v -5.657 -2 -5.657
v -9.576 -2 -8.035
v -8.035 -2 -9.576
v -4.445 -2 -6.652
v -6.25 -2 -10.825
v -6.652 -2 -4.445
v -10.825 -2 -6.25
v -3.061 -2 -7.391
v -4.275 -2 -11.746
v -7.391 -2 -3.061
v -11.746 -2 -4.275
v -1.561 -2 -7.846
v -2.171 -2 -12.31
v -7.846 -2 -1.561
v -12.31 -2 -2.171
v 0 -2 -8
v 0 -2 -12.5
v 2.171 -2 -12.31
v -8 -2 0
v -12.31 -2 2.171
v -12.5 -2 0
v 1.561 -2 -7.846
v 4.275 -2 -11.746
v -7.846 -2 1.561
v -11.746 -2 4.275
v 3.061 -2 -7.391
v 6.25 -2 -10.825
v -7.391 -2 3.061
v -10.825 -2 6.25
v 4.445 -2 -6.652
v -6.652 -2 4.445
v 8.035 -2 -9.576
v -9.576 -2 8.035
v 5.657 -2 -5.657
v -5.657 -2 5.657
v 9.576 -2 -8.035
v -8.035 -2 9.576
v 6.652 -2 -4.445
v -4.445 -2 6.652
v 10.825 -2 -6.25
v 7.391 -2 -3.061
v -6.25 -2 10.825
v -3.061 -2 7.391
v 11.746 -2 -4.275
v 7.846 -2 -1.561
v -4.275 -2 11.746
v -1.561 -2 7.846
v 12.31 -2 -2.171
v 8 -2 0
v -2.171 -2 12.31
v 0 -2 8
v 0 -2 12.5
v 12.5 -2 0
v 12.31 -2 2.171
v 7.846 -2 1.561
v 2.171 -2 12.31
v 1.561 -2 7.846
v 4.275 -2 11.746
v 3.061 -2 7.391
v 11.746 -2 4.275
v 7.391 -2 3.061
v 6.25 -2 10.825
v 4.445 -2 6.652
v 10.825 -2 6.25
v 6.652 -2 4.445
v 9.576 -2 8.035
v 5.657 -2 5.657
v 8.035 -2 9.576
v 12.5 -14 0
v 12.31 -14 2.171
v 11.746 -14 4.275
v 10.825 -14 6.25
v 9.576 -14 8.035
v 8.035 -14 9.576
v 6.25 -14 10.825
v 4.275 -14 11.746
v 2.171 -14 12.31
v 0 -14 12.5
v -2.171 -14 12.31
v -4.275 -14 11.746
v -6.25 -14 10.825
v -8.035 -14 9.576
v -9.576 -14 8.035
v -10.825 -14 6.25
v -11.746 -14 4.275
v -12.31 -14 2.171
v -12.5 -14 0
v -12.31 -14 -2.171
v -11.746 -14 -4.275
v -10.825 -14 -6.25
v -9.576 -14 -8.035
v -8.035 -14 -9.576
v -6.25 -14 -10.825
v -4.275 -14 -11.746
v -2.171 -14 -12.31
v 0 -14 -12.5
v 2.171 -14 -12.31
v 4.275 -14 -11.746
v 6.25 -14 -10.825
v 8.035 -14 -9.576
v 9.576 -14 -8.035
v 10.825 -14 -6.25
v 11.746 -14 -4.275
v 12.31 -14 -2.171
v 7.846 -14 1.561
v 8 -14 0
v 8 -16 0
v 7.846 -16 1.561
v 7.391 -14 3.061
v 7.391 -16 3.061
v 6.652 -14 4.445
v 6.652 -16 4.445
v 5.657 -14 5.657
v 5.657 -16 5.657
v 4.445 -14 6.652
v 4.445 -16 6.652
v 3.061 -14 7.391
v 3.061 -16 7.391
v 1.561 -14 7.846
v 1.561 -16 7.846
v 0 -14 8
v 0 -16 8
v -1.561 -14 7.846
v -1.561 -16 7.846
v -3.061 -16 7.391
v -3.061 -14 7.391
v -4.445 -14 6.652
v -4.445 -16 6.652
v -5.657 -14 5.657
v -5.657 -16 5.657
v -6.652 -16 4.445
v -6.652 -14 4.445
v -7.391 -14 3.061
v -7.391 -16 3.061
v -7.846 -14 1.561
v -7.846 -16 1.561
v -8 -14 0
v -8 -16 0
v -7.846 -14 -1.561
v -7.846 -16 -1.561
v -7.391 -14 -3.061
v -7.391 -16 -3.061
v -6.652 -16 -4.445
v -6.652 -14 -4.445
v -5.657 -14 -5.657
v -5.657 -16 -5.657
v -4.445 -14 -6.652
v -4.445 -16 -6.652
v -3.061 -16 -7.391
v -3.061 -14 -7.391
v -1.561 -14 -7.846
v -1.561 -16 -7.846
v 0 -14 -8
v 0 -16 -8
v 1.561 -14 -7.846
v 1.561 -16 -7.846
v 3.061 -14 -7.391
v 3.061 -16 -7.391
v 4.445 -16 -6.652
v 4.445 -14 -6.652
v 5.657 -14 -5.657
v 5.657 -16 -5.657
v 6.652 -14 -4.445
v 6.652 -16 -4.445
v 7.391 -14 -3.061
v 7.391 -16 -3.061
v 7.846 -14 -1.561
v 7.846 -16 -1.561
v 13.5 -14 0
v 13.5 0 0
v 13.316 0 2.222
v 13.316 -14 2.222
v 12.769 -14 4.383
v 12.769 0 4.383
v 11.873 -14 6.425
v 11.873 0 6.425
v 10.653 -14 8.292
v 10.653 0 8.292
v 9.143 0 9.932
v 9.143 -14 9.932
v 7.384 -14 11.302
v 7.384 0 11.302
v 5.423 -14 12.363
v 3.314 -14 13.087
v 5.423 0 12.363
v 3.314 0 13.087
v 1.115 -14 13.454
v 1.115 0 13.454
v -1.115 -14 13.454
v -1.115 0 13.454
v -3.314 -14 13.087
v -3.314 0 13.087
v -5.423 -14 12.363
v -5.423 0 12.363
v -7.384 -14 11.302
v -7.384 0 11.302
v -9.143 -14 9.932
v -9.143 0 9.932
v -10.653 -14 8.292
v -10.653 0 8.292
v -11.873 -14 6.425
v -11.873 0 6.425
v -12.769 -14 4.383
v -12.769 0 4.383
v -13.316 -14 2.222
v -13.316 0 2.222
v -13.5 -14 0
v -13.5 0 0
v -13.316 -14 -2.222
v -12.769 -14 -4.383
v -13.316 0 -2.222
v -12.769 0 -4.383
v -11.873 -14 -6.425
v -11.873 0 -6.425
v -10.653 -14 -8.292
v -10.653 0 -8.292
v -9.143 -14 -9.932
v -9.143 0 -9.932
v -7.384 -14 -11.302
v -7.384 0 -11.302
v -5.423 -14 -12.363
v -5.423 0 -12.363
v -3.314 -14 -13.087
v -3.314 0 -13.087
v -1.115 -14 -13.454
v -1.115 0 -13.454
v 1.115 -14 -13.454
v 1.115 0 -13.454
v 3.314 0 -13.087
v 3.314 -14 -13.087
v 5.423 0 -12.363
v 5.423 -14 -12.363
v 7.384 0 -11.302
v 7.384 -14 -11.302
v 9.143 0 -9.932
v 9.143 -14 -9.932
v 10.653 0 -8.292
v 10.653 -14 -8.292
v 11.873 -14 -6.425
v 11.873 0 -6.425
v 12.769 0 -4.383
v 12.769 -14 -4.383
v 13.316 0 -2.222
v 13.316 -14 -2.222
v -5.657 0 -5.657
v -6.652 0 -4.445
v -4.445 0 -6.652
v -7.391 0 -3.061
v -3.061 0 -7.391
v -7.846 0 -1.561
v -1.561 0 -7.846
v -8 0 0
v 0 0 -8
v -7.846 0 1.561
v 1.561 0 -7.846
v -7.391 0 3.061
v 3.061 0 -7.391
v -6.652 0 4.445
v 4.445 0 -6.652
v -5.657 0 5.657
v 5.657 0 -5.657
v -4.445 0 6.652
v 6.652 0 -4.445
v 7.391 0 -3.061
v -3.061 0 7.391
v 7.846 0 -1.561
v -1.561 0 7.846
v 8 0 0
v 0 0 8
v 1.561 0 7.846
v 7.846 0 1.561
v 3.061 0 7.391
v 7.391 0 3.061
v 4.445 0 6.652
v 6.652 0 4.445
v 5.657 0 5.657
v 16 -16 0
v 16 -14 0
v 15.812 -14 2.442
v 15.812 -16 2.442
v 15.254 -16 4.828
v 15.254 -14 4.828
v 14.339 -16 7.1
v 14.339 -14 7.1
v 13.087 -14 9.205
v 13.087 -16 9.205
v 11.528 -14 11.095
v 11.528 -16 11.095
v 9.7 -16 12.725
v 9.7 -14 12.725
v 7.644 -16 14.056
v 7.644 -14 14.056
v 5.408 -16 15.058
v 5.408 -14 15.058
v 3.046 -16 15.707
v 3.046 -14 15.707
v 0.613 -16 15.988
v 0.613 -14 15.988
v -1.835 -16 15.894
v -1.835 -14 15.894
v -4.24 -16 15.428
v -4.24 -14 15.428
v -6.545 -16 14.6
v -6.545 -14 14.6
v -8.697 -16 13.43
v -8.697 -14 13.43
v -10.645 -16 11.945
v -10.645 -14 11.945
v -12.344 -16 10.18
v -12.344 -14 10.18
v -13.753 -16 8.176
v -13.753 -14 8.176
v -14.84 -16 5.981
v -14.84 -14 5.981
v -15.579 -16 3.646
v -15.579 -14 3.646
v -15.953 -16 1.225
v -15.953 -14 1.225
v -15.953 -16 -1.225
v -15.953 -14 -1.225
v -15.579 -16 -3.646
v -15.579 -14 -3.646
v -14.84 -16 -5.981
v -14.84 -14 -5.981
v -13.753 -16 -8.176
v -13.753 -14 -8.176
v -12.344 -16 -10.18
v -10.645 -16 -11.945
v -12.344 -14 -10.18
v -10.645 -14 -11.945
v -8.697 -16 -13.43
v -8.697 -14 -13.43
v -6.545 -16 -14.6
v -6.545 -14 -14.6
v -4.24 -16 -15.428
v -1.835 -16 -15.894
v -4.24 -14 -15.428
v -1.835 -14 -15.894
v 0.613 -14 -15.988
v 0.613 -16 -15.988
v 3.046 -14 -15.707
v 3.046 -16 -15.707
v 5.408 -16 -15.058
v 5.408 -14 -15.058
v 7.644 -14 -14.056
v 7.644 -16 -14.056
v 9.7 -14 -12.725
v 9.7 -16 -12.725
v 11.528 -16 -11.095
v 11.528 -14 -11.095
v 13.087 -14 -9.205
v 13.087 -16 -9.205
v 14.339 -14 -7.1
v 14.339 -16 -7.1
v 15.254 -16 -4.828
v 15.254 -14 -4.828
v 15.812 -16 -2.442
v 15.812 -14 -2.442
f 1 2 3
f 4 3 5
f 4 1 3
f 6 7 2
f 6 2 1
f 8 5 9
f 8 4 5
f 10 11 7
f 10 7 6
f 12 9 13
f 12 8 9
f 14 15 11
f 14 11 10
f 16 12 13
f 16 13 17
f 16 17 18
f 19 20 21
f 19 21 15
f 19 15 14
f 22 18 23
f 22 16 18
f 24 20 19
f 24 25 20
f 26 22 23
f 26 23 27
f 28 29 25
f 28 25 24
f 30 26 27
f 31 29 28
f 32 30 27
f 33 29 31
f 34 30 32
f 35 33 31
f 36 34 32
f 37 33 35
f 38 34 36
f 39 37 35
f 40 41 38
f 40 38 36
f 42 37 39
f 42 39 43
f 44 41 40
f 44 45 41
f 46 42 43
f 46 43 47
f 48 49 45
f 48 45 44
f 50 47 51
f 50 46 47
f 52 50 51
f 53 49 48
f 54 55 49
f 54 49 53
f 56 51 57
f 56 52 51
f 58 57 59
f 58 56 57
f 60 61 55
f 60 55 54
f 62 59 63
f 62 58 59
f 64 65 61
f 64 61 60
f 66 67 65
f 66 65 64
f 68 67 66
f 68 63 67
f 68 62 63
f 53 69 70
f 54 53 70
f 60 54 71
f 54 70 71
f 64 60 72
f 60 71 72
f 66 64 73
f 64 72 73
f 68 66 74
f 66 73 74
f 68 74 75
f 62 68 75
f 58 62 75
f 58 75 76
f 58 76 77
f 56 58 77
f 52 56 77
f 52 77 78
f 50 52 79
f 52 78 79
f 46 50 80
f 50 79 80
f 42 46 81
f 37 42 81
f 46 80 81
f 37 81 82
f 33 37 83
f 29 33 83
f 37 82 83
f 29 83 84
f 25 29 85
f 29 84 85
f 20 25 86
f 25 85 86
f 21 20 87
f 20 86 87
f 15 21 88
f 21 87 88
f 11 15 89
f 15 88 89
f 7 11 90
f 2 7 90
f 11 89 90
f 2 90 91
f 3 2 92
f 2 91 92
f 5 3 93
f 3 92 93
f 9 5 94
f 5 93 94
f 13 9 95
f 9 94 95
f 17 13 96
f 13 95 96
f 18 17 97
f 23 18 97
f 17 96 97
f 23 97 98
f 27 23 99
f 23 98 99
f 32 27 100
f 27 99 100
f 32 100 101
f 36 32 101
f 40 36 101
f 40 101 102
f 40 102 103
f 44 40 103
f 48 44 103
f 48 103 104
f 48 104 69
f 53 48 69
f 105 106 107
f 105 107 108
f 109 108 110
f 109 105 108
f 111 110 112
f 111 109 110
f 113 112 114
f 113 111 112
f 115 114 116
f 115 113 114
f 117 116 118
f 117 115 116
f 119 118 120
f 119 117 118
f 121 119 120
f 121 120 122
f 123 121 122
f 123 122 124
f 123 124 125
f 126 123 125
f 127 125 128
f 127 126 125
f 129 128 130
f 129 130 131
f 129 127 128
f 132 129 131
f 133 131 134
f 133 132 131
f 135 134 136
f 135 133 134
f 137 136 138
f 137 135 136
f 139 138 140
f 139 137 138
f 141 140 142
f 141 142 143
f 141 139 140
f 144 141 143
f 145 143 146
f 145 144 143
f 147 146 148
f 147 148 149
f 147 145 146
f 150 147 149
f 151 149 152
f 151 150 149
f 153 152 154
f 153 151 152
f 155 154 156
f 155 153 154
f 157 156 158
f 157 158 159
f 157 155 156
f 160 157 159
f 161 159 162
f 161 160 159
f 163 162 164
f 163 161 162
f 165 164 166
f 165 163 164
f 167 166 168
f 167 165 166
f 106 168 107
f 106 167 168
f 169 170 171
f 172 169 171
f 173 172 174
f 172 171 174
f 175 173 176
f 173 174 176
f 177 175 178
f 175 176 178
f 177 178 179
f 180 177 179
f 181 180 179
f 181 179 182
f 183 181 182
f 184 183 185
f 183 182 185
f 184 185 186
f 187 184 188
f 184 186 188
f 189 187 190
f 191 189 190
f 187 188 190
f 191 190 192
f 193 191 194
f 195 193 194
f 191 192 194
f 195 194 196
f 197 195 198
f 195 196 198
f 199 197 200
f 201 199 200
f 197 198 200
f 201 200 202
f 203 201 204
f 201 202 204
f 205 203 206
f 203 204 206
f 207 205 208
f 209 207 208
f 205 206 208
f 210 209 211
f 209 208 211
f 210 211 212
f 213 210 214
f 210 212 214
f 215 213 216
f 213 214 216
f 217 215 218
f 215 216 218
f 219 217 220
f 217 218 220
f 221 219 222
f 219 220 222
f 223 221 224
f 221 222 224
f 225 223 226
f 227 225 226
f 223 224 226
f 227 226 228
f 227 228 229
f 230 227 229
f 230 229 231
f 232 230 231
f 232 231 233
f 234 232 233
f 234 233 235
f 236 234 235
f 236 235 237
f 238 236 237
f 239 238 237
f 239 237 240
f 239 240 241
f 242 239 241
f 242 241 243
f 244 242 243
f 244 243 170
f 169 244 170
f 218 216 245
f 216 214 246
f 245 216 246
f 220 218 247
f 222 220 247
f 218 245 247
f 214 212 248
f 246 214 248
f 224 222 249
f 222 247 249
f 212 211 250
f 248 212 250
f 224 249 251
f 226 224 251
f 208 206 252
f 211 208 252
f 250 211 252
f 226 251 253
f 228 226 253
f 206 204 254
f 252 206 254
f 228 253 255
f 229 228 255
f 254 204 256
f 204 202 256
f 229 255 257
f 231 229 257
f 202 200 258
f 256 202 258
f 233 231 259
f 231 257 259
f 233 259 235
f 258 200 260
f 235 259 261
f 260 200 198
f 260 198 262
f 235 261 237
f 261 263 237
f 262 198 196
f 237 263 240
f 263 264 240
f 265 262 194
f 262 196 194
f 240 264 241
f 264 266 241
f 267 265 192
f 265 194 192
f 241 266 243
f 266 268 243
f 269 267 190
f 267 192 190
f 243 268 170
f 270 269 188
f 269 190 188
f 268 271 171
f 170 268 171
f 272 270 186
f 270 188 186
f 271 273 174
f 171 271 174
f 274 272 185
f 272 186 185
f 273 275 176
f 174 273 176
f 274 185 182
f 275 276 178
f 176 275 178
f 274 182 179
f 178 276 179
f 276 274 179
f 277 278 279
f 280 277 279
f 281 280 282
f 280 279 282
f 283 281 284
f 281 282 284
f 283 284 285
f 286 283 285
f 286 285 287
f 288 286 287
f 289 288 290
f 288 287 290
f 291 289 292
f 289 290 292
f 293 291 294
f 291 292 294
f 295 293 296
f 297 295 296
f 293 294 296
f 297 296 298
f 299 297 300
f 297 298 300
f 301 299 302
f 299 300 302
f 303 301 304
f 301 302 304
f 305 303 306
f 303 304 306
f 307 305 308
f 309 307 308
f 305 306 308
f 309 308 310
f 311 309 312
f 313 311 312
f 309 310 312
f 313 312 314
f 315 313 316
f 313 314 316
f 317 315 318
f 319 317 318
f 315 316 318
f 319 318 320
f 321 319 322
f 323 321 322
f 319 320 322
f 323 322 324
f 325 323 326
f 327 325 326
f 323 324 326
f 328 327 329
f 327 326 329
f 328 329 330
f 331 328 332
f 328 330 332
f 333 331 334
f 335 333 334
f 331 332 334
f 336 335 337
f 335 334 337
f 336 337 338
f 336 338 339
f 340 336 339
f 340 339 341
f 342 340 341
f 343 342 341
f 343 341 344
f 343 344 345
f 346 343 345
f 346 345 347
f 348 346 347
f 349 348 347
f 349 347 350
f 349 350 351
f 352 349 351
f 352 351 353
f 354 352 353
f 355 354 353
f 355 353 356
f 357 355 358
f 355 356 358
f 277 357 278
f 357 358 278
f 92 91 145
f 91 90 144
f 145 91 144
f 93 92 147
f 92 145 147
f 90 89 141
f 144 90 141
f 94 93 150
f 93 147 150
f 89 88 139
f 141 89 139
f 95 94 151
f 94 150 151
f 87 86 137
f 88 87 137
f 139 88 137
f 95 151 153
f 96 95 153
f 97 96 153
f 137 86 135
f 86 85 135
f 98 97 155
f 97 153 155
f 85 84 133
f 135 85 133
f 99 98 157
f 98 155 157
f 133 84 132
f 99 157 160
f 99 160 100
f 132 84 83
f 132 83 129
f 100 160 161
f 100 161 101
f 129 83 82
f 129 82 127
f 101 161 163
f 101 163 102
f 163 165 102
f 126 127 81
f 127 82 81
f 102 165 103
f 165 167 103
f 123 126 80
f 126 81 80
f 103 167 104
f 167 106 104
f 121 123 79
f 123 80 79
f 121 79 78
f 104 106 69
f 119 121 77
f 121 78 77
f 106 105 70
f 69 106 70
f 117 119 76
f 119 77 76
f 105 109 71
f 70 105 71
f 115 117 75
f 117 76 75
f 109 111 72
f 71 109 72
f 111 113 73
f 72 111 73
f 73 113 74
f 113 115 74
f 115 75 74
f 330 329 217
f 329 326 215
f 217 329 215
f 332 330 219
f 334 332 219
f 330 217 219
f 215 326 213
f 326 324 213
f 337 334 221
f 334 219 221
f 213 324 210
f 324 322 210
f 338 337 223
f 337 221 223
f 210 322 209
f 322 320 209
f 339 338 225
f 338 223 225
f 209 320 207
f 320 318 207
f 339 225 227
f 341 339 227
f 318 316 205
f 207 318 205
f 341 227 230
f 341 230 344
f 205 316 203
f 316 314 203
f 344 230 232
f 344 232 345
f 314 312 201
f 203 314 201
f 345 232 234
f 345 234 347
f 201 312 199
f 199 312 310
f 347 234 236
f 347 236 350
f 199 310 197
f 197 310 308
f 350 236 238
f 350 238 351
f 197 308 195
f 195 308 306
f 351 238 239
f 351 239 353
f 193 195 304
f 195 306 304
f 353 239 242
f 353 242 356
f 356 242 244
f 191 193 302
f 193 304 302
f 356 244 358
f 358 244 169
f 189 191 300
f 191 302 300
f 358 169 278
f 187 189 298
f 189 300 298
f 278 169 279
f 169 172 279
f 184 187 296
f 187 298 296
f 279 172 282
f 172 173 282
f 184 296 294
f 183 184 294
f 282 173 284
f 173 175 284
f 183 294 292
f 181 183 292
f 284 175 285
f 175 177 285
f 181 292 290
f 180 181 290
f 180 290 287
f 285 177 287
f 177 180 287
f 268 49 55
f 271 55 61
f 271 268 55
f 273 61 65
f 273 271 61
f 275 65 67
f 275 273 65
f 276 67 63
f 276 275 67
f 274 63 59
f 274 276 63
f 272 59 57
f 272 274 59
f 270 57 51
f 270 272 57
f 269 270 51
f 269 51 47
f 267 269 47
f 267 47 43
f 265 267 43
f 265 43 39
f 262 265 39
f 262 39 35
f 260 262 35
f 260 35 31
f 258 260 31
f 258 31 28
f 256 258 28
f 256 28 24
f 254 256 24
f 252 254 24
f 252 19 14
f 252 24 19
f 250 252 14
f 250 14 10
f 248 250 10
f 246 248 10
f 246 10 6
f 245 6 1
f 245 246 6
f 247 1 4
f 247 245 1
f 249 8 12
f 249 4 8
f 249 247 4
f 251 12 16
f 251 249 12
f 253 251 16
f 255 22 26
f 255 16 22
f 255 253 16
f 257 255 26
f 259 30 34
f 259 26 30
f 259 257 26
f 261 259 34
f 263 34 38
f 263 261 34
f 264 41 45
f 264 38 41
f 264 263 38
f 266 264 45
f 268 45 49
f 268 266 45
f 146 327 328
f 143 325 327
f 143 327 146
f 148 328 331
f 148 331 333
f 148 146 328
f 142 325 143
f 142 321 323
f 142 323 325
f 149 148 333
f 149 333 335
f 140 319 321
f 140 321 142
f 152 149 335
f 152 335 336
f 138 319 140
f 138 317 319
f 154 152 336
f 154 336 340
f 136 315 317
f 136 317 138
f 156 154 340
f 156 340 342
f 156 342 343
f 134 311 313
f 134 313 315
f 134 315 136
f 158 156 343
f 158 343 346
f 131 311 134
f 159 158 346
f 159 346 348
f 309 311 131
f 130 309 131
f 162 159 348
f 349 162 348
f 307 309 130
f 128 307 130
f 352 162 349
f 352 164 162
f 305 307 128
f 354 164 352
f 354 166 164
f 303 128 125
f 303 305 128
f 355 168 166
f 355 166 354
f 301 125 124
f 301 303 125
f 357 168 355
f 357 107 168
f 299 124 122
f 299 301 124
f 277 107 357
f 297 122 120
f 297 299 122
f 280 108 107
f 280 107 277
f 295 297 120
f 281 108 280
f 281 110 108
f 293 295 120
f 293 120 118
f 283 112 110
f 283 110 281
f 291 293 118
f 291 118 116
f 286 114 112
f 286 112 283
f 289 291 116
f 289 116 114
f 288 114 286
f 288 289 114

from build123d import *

# Parameters (mm, degrees)
F0_R     = 13.5
F0_R_2   = 8
F1_DEPTH = 14
F2_R     = 12.5
F3_DEPTH = 12
F4_R     = 16
F4_R_2   = 8
F5_DEPTH = 2


with BuildPart() as f1:
    # F0 (on Front) → F1 (new body)
    with BuildSketch(Plane.XZ):
        Circle(F0_R)
        Circle(F0_R_2, mode=Mode.SUBTRACT)
    extrude(amount=F1_DEPTH)

    # F2 (on face) → F3 (cut)
    with BuildSketch(Plane.XZ.offset(14)):
        Circle(F2_R)
    extrude(amount=-F3_DEPTH, mode=Mode.SUBTRACT)

    # F4 (on face) → F5 (join)
    with BuildSketch(Plane.XZ.offset(14)):
        Circle(F4_R)
        Circle(F4_R_2, mode=Mode.SUBTRACT)
    extrude(amount=F5_DEPTH)


solid = f1.part
